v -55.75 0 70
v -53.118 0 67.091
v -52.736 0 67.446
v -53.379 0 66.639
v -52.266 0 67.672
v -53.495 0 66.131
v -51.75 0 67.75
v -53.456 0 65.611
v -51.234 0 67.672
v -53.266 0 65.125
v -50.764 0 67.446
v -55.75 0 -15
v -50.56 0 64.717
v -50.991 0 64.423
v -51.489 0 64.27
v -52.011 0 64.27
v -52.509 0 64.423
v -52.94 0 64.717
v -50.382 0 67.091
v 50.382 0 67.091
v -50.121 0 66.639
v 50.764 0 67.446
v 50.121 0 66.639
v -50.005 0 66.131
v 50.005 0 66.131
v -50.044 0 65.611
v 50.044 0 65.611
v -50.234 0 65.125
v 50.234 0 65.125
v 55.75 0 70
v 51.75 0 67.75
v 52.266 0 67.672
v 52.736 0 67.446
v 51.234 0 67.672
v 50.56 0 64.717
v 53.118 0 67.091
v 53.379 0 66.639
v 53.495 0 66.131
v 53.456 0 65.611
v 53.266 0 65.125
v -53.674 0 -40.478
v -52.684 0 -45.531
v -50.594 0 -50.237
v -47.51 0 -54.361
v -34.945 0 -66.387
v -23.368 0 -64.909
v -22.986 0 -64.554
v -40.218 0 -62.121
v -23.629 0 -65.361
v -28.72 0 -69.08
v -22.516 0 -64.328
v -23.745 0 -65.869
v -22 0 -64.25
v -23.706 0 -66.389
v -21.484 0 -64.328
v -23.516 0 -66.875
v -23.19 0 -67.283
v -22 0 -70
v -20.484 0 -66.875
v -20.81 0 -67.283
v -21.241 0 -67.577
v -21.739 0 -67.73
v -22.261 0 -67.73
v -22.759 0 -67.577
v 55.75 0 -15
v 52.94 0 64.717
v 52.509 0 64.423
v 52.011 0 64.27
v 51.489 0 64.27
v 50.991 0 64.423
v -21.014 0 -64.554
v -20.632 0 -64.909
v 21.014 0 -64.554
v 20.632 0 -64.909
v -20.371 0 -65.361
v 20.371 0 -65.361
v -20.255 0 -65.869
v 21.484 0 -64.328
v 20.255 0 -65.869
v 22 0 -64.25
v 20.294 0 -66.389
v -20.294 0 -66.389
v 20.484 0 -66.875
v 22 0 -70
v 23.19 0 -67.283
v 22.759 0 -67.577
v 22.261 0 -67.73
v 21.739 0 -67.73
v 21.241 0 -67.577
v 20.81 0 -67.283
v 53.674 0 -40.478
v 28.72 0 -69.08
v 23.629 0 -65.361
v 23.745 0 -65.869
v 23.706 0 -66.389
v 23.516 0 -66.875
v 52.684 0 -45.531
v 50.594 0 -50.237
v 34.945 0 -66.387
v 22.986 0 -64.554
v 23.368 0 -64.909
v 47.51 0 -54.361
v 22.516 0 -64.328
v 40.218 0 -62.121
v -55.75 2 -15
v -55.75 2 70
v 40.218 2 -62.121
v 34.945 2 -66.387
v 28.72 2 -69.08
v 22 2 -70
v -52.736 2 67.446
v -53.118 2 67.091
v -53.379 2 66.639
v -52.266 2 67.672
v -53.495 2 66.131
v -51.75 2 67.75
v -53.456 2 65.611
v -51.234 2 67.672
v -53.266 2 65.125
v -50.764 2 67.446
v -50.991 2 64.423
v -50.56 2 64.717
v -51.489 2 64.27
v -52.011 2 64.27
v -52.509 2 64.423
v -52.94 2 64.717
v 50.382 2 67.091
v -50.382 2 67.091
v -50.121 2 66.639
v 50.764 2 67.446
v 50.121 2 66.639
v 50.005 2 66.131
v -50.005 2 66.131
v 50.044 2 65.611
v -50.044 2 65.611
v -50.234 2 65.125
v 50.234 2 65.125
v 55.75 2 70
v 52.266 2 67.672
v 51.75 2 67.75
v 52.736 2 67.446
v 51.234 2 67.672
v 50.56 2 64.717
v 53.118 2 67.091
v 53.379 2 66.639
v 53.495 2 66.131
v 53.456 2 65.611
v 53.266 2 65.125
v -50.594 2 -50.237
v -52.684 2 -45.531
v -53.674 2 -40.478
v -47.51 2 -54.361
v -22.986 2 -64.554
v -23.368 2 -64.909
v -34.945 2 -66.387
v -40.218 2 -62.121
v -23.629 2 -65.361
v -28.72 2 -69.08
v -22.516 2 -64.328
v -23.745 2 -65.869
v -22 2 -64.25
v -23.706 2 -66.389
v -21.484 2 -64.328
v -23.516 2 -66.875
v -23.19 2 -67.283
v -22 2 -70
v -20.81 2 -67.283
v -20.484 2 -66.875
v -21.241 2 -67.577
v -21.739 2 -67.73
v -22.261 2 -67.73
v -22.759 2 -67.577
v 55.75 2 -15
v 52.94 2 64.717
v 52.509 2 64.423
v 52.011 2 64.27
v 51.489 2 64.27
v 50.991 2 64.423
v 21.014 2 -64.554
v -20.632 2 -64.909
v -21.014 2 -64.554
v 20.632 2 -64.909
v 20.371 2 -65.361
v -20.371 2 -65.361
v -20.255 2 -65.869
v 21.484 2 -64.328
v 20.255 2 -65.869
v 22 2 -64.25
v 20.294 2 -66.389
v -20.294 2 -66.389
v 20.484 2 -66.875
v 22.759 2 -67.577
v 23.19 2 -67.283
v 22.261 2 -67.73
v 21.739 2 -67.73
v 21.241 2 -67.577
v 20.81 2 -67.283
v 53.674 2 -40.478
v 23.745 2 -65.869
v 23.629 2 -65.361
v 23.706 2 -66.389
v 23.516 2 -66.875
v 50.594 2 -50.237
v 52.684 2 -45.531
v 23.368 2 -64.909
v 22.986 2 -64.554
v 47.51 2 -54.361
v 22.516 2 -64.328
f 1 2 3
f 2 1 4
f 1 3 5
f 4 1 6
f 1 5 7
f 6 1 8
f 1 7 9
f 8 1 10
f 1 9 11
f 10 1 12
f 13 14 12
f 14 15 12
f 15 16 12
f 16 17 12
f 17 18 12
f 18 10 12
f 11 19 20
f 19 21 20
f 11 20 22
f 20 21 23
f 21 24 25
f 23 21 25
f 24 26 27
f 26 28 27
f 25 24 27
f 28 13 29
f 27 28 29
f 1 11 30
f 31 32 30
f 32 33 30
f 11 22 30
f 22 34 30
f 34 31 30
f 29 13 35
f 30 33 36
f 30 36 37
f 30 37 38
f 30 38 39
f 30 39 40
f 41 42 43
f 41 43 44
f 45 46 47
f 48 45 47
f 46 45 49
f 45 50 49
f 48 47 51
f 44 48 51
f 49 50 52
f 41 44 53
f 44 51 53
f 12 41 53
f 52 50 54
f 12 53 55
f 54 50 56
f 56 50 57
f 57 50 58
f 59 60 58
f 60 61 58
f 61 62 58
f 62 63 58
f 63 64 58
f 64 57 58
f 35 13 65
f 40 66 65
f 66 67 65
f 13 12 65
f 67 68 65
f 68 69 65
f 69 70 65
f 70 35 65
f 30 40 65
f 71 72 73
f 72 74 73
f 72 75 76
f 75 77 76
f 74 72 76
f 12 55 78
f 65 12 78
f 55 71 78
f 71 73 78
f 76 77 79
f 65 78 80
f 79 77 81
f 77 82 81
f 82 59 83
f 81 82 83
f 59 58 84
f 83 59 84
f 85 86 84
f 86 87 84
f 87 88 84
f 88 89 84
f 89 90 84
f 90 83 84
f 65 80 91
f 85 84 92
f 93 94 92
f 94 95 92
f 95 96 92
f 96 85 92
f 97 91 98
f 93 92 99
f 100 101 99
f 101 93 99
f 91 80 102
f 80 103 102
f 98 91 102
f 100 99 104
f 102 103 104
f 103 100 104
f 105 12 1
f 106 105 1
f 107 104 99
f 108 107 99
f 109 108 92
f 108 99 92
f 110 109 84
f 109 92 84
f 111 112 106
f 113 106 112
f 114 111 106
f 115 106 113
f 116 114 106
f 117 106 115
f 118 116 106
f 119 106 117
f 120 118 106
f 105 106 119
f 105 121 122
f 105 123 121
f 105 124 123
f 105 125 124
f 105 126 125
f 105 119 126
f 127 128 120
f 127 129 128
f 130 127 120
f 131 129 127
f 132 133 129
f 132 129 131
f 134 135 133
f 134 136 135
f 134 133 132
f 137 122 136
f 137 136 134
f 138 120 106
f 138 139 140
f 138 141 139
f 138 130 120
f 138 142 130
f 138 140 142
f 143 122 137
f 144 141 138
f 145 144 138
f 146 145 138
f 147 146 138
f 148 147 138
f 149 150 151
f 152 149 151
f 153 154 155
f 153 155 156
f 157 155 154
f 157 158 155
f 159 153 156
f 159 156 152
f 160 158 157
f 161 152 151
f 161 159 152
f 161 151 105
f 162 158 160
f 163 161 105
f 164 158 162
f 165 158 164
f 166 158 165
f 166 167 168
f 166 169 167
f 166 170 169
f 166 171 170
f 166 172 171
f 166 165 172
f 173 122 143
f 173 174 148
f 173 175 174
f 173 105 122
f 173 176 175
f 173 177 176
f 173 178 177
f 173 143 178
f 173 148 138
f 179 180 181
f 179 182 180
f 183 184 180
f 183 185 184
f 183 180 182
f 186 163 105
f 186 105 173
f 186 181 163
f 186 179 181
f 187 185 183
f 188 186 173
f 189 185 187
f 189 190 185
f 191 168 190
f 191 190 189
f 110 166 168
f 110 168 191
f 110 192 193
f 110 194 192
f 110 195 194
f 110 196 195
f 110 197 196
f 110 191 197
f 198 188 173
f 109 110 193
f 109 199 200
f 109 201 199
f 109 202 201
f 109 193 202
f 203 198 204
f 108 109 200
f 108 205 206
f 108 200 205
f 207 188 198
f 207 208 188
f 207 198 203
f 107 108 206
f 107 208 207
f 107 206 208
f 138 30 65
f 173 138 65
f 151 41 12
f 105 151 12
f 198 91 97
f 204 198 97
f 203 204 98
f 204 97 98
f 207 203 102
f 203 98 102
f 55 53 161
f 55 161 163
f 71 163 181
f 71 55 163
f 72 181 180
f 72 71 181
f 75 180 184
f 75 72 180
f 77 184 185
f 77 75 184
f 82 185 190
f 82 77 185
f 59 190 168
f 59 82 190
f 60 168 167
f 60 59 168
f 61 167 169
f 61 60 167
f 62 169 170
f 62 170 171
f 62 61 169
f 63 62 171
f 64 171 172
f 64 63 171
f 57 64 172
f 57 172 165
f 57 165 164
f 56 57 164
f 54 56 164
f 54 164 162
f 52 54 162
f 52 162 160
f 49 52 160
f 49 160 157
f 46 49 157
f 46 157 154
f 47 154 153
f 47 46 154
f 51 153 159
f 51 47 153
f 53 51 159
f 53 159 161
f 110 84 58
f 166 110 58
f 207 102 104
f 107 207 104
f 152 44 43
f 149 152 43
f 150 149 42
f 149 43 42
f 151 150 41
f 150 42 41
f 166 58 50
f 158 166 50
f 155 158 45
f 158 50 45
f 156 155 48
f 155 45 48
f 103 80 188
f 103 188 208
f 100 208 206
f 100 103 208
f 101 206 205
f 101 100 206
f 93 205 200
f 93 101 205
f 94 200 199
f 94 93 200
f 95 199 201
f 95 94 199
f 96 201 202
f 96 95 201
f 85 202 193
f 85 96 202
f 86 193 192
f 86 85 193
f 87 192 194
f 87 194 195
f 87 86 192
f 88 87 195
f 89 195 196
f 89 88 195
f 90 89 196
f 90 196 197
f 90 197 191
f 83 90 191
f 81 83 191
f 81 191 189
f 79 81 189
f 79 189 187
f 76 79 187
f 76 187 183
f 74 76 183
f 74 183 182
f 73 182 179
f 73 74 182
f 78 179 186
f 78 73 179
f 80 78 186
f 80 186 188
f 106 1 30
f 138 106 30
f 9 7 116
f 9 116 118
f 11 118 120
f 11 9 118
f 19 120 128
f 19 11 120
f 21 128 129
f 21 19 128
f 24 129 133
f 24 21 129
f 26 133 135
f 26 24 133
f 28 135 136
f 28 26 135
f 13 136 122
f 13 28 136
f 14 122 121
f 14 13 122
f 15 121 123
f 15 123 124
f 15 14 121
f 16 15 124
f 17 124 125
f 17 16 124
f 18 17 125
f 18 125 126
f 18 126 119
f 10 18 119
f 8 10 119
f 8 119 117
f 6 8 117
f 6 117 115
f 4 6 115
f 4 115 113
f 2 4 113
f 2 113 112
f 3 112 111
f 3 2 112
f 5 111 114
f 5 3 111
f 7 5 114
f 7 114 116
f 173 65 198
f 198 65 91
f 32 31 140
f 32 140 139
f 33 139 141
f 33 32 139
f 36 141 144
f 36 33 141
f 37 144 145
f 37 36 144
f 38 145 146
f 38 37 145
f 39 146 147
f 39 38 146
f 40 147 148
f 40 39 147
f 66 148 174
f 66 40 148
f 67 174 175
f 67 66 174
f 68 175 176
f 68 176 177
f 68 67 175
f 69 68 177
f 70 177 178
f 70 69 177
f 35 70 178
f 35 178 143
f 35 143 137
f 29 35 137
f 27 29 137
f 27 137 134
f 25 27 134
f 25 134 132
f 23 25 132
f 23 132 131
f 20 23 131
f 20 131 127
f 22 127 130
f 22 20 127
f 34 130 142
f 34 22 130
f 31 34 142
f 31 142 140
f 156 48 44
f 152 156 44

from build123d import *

# Parameters (mm, degrees)
ESQUISSE1_R        = 1.75
BOSS_EXTRU_1_DEPTH = 2


with BuildPart() as part:
    # Esquisse1 → Boss.-Extru.1 (new body)
    with BuildSketch(Plane(origin=(0, 0, 0), x_dir=(1, 0, 0), z_dir=(0, 1, 0))):
        with BuildLine():
            Line((55.75, -70), (55.75, 15))
            Line((55.75, 15), (53.674026321, 40.47775659))
            ThreePointArc((53.674026321, 40.47775659), (51.771291303, 47.94288813), (47.510174455, 54.360946457))
            Line((47.510174455, 54.360946457), (40.217580929, 62.120740202))
            ThreePointArc((40.217580929, 62.120740202), (31.924250474, 67.945789429), (22, 70))
            Line((22, 70), (-22, 70))
            ThreePointArc((-22, 70), (-31.924250474, 67.945789429), (-40.217580929, 62.120740202))
            Line((-40.217580929, 62.120740202), (-47.510174455, 54.360946457))
            ThreePointArc((-47.510174455, 54.360946457), (-51.771291303, 47.94288813), (-53.674026321, 40.47775659))
            Line((-53.674026321, 40.47775659), (-55.75, 15))
            Line((-55.75, 15), (-55.75, -70))
            Line((-55.75, -70), (55.75, -70))
        make_face()
        with Locations(Location((-51.75, -66, 0), (0, 0, 270))):
            Circle(ESQUISSE1_R, mode=Mode.SUBTRACT)
        with Locations(Location((51.75, -66, 0), (0, 0, 270))):
            Circle(ESQUISSE1_R, mode=Mode.SUBTRACT)
        with Locations(Location((22, 66, 0), (0, 0, 270))):
            Circle(ESQUISSE1_R, mode=Mode.SUBTRACT)
        with Locations(Location((-22, 66, 0), (0, 0, 270))):
            Circle(ESQUISSE1_R, mode=Mode.SUBTRACT)
    extrude(amount=BOSS_EXTRU_1_DEPTH)


solid = part.part
